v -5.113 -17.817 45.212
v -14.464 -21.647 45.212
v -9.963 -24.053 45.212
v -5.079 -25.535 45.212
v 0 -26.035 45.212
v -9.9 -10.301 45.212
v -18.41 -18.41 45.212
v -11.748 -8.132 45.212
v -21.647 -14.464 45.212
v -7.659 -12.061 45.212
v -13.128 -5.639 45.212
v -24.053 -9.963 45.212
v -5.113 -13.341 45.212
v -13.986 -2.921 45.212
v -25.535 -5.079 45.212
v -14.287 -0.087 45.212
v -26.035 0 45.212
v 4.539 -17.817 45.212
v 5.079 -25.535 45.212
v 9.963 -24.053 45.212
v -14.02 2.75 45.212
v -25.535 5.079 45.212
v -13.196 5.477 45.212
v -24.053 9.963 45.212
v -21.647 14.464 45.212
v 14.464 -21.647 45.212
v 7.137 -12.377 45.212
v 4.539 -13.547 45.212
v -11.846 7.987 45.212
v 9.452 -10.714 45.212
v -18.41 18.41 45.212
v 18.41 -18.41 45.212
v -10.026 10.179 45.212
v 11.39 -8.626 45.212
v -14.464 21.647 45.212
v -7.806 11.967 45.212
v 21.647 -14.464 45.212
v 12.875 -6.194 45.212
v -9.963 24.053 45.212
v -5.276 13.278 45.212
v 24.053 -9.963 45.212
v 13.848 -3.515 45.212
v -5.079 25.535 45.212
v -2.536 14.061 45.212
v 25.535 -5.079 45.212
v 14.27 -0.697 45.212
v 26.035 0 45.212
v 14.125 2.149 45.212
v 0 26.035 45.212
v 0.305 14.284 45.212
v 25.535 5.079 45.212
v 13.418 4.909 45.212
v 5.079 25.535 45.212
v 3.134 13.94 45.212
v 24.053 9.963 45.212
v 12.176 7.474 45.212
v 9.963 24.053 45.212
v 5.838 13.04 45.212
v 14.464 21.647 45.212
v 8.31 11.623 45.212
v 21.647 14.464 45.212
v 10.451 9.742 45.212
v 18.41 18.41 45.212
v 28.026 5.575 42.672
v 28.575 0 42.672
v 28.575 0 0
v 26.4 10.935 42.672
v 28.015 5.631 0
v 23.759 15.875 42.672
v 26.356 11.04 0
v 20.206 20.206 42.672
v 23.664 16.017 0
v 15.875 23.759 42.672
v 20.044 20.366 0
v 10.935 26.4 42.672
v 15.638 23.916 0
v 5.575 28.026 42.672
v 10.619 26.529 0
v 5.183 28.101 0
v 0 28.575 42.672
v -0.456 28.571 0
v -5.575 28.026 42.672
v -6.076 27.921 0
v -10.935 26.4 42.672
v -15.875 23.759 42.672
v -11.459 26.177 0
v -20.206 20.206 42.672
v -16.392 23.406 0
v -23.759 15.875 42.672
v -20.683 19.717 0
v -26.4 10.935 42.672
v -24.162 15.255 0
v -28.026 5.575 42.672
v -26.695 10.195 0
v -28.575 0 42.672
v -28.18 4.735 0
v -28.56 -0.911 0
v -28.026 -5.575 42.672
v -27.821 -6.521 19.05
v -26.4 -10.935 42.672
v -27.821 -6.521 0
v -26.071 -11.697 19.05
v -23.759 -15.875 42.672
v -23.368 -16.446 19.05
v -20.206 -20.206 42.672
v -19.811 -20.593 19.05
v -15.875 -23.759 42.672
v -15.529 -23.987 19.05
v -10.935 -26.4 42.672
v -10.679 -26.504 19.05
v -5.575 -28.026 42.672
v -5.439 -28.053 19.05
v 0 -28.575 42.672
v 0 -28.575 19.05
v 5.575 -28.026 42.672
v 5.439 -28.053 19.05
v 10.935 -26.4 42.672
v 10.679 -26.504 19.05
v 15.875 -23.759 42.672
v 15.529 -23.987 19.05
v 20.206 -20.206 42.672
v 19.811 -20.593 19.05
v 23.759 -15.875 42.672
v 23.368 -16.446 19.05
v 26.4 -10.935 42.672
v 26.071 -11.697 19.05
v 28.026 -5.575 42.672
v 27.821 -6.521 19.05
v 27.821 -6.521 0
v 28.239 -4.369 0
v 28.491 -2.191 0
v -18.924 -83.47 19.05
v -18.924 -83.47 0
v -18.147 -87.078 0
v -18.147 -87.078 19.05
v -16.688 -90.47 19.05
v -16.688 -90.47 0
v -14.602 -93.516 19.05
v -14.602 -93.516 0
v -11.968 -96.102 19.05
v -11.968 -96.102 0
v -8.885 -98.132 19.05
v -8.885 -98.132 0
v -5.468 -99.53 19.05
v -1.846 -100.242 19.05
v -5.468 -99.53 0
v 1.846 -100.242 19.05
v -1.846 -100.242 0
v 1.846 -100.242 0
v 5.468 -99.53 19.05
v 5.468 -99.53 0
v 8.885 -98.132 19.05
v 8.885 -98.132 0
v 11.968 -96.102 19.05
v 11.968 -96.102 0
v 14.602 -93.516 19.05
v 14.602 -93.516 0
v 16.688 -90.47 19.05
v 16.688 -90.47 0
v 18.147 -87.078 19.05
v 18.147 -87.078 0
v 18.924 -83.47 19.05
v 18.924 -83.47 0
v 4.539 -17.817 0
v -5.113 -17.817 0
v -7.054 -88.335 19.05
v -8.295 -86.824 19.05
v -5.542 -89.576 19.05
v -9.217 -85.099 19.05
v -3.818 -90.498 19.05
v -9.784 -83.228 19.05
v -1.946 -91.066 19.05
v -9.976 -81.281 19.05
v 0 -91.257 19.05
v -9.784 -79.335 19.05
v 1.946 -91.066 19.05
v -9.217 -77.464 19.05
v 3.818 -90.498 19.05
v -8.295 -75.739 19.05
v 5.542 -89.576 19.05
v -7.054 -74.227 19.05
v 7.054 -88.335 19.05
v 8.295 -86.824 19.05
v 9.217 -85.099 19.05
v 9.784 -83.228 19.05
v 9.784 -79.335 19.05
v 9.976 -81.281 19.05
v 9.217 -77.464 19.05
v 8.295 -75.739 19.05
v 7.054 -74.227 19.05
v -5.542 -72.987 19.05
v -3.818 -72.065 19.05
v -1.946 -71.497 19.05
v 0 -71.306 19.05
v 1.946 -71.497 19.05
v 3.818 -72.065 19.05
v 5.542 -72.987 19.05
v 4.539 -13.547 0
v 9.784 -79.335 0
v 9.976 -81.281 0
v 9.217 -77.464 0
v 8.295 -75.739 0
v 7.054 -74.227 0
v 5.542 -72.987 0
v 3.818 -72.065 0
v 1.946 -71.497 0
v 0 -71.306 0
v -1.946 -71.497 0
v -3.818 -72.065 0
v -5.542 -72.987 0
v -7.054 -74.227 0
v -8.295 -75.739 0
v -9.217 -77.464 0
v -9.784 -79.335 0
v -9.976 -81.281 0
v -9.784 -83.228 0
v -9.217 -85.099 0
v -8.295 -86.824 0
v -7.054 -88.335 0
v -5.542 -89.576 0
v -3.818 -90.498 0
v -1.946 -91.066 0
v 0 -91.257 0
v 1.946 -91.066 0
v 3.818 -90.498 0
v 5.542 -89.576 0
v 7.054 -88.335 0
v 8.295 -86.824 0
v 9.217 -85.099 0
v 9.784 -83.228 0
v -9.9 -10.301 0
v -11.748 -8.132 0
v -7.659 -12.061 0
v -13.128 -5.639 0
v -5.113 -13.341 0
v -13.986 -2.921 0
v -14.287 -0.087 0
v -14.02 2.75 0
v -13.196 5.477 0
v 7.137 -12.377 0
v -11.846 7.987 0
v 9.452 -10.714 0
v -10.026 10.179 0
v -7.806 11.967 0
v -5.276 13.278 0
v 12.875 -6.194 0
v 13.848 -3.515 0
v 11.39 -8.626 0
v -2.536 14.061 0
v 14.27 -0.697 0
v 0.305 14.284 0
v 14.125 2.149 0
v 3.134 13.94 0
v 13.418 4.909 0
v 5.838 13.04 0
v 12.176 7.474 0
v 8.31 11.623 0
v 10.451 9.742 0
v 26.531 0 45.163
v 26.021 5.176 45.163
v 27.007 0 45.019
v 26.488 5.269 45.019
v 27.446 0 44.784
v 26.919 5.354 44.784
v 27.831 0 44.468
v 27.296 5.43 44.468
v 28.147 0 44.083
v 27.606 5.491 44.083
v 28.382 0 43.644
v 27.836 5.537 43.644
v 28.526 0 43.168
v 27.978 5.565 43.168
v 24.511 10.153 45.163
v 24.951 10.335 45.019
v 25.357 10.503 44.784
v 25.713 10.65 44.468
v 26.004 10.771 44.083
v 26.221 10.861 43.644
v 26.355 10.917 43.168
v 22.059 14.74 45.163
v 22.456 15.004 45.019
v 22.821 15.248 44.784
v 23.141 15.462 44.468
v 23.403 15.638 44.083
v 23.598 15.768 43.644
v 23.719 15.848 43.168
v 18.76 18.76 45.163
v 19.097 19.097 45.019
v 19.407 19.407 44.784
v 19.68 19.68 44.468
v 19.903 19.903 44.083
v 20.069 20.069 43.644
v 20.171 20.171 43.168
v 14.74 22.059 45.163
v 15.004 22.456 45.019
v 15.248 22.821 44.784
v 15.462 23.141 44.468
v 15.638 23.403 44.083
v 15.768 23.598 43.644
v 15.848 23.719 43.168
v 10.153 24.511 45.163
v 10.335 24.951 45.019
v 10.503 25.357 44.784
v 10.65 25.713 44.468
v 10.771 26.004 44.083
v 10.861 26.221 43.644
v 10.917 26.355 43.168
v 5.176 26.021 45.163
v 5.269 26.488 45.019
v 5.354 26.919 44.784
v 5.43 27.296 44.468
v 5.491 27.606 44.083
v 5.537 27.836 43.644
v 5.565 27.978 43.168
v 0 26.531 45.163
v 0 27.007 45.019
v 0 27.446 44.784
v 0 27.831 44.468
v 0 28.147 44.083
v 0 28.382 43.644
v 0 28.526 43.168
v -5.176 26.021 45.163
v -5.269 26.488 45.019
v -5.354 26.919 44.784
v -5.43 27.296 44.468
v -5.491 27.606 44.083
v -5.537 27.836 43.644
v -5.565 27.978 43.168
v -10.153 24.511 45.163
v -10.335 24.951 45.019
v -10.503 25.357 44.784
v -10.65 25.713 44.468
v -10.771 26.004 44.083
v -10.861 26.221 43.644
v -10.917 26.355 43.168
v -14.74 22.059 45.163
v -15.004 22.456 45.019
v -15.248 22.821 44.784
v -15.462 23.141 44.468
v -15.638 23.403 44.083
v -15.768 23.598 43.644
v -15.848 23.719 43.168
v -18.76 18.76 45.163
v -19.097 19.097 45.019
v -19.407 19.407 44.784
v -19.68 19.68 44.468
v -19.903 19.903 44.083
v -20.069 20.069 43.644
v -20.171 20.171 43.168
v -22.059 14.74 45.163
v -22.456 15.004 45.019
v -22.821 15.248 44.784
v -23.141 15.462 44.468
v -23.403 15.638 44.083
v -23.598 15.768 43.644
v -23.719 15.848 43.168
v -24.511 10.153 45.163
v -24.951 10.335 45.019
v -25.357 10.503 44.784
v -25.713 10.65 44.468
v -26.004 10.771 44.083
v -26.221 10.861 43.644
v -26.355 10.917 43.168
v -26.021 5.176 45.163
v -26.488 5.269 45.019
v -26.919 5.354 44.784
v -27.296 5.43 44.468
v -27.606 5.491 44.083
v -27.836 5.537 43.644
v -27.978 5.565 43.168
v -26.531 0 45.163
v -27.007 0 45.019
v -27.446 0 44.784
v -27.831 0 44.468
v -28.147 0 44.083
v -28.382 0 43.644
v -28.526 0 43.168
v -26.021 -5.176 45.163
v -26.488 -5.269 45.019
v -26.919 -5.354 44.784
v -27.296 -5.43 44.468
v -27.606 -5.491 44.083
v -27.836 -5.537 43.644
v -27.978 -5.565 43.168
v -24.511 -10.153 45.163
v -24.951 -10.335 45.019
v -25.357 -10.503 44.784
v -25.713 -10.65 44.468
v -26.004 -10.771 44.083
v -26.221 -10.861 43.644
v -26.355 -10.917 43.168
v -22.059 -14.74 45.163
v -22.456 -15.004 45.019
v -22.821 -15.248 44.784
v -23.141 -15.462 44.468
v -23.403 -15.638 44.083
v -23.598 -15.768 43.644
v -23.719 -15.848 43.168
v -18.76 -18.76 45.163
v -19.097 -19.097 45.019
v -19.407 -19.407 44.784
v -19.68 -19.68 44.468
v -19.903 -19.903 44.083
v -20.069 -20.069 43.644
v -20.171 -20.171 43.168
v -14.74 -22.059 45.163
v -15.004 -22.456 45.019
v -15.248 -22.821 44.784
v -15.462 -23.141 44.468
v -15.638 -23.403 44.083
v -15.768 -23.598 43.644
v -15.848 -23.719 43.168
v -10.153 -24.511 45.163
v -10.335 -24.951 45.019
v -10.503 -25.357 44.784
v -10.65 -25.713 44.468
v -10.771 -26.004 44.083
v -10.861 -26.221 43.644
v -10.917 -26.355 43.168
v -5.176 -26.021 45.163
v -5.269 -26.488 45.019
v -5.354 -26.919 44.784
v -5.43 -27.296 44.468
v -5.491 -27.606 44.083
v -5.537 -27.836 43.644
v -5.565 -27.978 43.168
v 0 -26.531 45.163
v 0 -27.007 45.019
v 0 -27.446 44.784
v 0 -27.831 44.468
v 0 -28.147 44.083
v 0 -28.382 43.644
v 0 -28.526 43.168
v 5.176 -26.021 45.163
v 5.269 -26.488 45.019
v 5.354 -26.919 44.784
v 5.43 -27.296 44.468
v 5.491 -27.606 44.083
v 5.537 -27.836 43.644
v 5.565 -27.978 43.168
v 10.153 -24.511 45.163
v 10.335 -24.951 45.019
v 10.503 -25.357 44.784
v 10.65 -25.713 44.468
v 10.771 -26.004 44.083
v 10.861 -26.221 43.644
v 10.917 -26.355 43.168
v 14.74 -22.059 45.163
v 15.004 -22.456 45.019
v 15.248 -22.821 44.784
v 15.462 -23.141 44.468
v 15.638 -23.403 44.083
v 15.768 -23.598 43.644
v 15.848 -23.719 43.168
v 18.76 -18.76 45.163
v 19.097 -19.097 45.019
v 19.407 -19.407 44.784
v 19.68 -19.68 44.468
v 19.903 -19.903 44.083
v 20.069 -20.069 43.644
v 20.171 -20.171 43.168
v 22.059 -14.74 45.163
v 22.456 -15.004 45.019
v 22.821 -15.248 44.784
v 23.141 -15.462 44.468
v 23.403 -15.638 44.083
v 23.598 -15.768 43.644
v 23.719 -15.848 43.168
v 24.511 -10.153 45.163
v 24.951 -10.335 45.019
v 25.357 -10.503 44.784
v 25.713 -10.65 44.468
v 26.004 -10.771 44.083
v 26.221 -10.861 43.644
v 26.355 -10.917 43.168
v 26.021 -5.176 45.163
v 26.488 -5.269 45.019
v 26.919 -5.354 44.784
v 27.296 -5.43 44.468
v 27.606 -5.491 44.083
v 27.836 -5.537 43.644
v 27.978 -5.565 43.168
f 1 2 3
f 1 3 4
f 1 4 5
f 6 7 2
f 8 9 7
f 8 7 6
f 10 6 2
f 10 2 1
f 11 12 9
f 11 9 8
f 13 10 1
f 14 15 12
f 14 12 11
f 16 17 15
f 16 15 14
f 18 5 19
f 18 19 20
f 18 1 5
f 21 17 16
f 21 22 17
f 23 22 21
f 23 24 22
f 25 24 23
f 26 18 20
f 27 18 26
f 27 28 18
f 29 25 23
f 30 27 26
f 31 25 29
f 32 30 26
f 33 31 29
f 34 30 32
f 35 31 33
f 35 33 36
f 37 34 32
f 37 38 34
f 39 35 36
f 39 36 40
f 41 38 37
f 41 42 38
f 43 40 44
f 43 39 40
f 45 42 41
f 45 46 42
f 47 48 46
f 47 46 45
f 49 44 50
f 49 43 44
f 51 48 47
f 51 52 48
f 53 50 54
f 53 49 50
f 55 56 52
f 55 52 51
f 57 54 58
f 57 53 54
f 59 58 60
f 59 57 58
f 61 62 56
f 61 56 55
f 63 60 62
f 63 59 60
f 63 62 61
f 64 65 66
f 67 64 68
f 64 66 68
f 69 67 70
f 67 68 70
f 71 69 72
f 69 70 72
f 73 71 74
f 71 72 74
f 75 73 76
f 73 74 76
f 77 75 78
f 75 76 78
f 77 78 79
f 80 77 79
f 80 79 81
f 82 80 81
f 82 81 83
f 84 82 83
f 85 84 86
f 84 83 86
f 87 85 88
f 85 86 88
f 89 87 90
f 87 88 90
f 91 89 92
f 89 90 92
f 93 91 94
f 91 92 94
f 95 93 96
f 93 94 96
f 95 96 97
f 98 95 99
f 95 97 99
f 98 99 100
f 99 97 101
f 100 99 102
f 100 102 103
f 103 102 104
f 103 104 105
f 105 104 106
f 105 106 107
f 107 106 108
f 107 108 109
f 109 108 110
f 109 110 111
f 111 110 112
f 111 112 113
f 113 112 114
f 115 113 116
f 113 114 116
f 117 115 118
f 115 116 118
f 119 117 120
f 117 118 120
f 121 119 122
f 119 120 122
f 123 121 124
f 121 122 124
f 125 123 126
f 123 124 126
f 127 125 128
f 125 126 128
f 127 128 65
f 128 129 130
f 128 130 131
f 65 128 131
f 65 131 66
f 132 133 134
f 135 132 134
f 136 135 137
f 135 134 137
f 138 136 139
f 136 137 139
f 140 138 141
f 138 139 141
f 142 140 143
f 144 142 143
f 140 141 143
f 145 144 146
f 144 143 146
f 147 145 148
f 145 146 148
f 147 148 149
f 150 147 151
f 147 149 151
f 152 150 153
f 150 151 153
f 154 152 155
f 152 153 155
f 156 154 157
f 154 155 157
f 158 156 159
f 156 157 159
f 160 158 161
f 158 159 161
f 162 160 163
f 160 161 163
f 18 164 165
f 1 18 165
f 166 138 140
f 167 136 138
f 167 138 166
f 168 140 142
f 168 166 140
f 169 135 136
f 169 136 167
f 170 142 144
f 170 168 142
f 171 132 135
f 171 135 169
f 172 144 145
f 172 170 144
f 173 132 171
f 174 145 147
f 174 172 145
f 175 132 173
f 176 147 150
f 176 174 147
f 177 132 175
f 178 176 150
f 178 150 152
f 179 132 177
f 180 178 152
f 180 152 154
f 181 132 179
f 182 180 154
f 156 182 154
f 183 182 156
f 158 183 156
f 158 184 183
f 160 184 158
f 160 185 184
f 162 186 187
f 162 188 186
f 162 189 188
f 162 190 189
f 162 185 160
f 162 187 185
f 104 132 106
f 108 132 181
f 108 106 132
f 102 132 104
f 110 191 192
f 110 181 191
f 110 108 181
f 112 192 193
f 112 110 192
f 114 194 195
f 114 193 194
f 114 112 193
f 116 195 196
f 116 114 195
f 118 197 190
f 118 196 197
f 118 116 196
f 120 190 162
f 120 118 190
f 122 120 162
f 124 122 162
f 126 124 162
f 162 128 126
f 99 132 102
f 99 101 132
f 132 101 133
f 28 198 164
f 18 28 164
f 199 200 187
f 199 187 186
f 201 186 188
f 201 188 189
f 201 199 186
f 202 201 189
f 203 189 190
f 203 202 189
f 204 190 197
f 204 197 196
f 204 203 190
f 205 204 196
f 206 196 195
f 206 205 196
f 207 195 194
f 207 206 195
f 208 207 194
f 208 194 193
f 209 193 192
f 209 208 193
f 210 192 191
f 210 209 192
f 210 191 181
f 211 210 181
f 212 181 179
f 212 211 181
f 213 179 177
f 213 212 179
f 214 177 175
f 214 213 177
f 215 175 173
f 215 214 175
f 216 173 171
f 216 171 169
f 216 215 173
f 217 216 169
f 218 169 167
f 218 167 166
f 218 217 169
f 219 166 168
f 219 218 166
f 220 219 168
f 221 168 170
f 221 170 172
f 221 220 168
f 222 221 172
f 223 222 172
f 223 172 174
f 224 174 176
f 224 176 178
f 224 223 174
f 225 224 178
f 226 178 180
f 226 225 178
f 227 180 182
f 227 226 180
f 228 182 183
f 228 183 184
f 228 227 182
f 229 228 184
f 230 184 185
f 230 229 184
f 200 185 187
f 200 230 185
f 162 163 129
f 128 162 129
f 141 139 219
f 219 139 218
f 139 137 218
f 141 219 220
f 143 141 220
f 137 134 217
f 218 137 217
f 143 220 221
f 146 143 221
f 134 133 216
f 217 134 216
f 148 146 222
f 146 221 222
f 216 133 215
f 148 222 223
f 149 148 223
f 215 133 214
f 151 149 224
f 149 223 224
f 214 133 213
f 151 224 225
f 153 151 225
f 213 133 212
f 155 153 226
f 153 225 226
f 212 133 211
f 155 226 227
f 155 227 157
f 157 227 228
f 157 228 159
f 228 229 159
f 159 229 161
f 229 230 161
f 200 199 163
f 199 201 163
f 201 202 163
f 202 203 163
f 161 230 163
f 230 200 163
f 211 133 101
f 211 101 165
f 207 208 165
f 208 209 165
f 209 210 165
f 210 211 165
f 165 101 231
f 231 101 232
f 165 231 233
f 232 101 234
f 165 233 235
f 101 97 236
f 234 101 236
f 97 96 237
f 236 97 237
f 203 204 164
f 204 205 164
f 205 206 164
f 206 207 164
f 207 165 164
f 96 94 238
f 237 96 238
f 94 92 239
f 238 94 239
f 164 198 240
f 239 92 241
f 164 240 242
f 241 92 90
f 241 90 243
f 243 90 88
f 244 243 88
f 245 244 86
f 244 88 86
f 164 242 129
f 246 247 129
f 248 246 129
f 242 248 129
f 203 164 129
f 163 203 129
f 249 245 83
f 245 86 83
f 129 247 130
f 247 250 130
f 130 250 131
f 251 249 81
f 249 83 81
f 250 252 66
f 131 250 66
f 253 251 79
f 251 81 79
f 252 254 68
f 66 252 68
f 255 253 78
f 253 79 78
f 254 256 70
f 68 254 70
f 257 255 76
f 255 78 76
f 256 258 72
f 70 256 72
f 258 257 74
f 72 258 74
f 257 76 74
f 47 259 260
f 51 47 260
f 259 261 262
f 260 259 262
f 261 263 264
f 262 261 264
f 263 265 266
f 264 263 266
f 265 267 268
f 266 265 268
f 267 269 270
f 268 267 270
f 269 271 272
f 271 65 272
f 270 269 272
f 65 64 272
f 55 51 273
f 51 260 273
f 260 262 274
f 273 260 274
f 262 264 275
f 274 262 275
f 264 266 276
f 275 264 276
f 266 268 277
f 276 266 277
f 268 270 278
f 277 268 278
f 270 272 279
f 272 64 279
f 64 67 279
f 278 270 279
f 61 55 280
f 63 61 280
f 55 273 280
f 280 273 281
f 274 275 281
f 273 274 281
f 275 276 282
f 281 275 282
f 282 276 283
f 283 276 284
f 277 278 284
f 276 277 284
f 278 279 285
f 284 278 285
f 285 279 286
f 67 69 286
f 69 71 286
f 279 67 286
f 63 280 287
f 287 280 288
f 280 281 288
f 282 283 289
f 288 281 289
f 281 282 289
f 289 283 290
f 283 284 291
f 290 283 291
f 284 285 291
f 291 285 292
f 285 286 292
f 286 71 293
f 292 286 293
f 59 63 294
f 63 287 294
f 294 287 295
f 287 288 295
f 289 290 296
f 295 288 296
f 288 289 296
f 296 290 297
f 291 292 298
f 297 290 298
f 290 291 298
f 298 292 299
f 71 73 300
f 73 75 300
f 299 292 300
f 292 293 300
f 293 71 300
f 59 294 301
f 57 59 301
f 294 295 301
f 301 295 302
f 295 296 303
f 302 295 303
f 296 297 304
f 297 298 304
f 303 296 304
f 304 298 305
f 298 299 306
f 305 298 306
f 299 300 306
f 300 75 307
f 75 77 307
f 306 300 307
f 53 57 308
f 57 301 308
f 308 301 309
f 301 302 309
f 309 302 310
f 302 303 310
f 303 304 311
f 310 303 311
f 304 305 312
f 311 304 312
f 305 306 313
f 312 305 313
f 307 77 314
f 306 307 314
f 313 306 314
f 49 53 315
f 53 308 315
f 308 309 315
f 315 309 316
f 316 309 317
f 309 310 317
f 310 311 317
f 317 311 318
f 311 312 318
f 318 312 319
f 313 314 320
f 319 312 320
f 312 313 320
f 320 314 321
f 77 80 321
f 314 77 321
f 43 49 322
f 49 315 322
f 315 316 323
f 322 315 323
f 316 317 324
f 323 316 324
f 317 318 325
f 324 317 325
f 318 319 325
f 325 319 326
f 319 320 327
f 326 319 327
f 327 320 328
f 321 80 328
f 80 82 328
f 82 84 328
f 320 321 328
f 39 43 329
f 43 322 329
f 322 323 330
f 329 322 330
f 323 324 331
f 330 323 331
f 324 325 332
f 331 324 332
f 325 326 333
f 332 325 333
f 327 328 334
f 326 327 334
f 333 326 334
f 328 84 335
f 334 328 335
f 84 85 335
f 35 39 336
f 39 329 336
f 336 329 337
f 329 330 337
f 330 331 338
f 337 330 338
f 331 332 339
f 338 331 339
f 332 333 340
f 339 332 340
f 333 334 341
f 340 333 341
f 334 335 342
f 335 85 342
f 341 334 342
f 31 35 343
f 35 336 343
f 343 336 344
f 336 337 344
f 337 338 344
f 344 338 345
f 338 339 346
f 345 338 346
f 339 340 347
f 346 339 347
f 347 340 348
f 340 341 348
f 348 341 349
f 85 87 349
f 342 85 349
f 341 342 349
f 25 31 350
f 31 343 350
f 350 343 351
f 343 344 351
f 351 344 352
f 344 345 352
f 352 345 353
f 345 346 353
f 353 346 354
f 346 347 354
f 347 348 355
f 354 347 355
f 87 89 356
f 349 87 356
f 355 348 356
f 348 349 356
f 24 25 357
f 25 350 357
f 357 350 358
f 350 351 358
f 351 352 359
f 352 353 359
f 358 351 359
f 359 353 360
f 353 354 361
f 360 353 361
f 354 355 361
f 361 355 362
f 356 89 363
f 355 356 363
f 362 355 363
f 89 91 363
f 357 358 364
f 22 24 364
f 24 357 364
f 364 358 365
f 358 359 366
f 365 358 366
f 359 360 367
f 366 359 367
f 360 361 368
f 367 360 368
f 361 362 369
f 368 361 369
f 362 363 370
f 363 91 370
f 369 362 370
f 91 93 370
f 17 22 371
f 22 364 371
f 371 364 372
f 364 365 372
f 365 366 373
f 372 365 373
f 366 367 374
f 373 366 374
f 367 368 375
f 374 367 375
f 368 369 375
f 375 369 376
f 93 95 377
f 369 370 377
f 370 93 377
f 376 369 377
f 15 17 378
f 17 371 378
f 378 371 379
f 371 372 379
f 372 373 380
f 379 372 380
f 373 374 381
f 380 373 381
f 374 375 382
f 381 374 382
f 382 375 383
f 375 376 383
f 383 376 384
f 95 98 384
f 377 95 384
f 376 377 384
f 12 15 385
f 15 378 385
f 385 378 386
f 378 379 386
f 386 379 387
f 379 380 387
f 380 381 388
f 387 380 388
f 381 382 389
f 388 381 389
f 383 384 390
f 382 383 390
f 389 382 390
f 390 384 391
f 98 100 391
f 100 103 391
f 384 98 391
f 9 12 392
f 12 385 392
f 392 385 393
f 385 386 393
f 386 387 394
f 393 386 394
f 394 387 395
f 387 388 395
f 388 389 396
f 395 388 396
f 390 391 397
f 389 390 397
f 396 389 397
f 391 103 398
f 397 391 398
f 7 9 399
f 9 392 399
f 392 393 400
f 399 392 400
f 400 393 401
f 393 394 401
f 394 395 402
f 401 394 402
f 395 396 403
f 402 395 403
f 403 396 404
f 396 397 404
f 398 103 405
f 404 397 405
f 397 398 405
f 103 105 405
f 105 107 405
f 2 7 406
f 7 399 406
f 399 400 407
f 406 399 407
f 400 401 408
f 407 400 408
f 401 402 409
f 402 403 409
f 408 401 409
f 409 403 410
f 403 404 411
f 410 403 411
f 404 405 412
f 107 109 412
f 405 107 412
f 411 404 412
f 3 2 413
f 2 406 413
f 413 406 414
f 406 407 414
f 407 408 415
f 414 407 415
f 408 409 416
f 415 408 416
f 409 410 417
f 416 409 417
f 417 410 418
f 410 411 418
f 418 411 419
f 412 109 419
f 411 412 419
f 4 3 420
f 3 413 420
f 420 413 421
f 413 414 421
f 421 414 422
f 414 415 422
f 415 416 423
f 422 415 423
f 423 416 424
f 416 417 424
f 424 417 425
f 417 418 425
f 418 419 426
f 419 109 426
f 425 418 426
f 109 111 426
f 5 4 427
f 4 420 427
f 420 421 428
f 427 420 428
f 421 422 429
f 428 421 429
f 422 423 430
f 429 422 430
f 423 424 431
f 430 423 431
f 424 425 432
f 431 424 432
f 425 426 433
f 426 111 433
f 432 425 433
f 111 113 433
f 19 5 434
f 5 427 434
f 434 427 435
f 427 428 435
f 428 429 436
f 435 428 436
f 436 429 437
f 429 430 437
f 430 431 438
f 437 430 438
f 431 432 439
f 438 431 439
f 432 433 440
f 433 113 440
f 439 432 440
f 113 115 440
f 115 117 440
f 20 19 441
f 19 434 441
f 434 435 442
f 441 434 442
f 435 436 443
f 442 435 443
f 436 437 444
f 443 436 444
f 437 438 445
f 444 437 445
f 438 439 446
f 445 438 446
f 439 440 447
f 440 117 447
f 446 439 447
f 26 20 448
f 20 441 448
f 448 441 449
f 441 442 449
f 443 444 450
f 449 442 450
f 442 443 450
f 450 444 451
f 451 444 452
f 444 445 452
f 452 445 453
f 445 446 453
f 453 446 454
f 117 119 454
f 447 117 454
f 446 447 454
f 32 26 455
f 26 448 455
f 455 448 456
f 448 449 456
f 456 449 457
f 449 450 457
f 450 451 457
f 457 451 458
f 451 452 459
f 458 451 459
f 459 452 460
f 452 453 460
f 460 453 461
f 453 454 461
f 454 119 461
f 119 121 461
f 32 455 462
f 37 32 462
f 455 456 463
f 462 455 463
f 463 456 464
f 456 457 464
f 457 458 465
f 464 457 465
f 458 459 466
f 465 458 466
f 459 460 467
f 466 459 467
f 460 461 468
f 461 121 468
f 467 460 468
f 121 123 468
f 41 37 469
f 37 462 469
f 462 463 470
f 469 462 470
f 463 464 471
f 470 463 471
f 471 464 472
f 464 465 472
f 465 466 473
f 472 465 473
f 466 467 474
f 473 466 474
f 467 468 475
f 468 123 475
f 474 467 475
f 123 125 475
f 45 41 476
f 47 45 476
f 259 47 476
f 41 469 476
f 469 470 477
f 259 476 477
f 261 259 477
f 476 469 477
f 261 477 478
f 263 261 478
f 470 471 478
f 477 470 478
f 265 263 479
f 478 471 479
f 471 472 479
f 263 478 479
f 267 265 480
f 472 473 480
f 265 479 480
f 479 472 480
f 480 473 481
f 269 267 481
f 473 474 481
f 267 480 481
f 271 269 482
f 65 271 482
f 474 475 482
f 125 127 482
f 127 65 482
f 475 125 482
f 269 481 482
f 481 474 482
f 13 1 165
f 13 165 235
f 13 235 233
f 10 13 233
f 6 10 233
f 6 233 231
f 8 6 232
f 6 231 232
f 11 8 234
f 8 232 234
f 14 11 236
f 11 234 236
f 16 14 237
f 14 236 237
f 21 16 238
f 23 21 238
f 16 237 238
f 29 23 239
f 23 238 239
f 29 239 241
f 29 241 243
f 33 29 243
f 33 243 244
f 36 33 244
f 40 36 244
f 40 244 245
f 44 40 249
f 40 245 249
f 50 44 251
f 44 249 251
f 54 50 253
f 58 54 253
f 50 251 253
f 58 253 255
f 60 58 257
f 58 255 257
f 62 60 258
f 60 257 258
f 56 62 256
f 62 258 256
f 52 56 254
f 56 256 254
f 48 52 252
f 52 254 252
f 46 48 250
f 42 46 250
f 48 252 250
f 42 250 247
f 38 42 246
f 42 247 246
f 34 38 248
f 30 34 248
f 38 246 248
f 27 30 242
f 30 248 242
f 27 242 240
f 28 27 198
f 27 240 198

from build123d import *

# Parameters (mm, degrees)
F0_R     = 9.975886
F2_DEPTH = 19.05
F1_R     = 28.575
F3_DEPTH = 45.212
F4_R     = 2.54


with BuildPart() as f2:
    # F0 (on Top) → F2 (new body)
    with BuildSketch(Plane.XY):
        with BuildLine():
            Line((18.923924, -83.46952), (28.575, 0))
            ThreePointArc((28.575, 0), (0, 28.575), (-28.575, 0))
            Line((-28.575, 0), (-18.923924, -83.46952))
            ThreePointArc((-18.923924, -83.46952), (0, -100.331461), (18.923924, -83.46952))
        make_face()
        with Locations((0, -81.281461)):
            Circle(F0_R, mode=Mode.SUBTRACT)
        with BuildLine():
            ThreePointArc((-5.112984, -13.341291), (0.304913, 14.284246), (4.539016, -13.547324))
            Line((4.539016, -13.547324), (4.539016, -17.816696))
            Line((4.539016, -17.816696), (-5.112984, -17.816696))
            Line((-5.112984, -17.816696), (-5.112984, -13.341291))
        make_face(mode=Mode.SUBTRACT)
    extrude(amount=F2_DEPTH)

    # F1 (on Top) → F3 (join)
    with BuildSketch(Plane.XY):
        Circle(F1_R)
        with BuildLine():
            ThreePointArc((-5.112984, -13.341291), (0.304913, 14.284246), (4.539016, -13.547324))
            Line((4.539016, -13.547324), (4.539016, -17.816696))
            Line((4.539016, -17.816696), (-5.112984, -17.816696))
            Line((-5.112984, -17.816696), (-5.112984, -13.341291))
        make_face(mode=Mode.SUBTRACT)
    extrude(amount=F3_DEPTH)

    # F4
    f4_edges = [f2.edges().sort_by_distance(p)[0] for p in [
        (-28.575, 0, 45.212),
    ]]
    fillet(f4_edges, radius=F4_R)


solid = f2.part
